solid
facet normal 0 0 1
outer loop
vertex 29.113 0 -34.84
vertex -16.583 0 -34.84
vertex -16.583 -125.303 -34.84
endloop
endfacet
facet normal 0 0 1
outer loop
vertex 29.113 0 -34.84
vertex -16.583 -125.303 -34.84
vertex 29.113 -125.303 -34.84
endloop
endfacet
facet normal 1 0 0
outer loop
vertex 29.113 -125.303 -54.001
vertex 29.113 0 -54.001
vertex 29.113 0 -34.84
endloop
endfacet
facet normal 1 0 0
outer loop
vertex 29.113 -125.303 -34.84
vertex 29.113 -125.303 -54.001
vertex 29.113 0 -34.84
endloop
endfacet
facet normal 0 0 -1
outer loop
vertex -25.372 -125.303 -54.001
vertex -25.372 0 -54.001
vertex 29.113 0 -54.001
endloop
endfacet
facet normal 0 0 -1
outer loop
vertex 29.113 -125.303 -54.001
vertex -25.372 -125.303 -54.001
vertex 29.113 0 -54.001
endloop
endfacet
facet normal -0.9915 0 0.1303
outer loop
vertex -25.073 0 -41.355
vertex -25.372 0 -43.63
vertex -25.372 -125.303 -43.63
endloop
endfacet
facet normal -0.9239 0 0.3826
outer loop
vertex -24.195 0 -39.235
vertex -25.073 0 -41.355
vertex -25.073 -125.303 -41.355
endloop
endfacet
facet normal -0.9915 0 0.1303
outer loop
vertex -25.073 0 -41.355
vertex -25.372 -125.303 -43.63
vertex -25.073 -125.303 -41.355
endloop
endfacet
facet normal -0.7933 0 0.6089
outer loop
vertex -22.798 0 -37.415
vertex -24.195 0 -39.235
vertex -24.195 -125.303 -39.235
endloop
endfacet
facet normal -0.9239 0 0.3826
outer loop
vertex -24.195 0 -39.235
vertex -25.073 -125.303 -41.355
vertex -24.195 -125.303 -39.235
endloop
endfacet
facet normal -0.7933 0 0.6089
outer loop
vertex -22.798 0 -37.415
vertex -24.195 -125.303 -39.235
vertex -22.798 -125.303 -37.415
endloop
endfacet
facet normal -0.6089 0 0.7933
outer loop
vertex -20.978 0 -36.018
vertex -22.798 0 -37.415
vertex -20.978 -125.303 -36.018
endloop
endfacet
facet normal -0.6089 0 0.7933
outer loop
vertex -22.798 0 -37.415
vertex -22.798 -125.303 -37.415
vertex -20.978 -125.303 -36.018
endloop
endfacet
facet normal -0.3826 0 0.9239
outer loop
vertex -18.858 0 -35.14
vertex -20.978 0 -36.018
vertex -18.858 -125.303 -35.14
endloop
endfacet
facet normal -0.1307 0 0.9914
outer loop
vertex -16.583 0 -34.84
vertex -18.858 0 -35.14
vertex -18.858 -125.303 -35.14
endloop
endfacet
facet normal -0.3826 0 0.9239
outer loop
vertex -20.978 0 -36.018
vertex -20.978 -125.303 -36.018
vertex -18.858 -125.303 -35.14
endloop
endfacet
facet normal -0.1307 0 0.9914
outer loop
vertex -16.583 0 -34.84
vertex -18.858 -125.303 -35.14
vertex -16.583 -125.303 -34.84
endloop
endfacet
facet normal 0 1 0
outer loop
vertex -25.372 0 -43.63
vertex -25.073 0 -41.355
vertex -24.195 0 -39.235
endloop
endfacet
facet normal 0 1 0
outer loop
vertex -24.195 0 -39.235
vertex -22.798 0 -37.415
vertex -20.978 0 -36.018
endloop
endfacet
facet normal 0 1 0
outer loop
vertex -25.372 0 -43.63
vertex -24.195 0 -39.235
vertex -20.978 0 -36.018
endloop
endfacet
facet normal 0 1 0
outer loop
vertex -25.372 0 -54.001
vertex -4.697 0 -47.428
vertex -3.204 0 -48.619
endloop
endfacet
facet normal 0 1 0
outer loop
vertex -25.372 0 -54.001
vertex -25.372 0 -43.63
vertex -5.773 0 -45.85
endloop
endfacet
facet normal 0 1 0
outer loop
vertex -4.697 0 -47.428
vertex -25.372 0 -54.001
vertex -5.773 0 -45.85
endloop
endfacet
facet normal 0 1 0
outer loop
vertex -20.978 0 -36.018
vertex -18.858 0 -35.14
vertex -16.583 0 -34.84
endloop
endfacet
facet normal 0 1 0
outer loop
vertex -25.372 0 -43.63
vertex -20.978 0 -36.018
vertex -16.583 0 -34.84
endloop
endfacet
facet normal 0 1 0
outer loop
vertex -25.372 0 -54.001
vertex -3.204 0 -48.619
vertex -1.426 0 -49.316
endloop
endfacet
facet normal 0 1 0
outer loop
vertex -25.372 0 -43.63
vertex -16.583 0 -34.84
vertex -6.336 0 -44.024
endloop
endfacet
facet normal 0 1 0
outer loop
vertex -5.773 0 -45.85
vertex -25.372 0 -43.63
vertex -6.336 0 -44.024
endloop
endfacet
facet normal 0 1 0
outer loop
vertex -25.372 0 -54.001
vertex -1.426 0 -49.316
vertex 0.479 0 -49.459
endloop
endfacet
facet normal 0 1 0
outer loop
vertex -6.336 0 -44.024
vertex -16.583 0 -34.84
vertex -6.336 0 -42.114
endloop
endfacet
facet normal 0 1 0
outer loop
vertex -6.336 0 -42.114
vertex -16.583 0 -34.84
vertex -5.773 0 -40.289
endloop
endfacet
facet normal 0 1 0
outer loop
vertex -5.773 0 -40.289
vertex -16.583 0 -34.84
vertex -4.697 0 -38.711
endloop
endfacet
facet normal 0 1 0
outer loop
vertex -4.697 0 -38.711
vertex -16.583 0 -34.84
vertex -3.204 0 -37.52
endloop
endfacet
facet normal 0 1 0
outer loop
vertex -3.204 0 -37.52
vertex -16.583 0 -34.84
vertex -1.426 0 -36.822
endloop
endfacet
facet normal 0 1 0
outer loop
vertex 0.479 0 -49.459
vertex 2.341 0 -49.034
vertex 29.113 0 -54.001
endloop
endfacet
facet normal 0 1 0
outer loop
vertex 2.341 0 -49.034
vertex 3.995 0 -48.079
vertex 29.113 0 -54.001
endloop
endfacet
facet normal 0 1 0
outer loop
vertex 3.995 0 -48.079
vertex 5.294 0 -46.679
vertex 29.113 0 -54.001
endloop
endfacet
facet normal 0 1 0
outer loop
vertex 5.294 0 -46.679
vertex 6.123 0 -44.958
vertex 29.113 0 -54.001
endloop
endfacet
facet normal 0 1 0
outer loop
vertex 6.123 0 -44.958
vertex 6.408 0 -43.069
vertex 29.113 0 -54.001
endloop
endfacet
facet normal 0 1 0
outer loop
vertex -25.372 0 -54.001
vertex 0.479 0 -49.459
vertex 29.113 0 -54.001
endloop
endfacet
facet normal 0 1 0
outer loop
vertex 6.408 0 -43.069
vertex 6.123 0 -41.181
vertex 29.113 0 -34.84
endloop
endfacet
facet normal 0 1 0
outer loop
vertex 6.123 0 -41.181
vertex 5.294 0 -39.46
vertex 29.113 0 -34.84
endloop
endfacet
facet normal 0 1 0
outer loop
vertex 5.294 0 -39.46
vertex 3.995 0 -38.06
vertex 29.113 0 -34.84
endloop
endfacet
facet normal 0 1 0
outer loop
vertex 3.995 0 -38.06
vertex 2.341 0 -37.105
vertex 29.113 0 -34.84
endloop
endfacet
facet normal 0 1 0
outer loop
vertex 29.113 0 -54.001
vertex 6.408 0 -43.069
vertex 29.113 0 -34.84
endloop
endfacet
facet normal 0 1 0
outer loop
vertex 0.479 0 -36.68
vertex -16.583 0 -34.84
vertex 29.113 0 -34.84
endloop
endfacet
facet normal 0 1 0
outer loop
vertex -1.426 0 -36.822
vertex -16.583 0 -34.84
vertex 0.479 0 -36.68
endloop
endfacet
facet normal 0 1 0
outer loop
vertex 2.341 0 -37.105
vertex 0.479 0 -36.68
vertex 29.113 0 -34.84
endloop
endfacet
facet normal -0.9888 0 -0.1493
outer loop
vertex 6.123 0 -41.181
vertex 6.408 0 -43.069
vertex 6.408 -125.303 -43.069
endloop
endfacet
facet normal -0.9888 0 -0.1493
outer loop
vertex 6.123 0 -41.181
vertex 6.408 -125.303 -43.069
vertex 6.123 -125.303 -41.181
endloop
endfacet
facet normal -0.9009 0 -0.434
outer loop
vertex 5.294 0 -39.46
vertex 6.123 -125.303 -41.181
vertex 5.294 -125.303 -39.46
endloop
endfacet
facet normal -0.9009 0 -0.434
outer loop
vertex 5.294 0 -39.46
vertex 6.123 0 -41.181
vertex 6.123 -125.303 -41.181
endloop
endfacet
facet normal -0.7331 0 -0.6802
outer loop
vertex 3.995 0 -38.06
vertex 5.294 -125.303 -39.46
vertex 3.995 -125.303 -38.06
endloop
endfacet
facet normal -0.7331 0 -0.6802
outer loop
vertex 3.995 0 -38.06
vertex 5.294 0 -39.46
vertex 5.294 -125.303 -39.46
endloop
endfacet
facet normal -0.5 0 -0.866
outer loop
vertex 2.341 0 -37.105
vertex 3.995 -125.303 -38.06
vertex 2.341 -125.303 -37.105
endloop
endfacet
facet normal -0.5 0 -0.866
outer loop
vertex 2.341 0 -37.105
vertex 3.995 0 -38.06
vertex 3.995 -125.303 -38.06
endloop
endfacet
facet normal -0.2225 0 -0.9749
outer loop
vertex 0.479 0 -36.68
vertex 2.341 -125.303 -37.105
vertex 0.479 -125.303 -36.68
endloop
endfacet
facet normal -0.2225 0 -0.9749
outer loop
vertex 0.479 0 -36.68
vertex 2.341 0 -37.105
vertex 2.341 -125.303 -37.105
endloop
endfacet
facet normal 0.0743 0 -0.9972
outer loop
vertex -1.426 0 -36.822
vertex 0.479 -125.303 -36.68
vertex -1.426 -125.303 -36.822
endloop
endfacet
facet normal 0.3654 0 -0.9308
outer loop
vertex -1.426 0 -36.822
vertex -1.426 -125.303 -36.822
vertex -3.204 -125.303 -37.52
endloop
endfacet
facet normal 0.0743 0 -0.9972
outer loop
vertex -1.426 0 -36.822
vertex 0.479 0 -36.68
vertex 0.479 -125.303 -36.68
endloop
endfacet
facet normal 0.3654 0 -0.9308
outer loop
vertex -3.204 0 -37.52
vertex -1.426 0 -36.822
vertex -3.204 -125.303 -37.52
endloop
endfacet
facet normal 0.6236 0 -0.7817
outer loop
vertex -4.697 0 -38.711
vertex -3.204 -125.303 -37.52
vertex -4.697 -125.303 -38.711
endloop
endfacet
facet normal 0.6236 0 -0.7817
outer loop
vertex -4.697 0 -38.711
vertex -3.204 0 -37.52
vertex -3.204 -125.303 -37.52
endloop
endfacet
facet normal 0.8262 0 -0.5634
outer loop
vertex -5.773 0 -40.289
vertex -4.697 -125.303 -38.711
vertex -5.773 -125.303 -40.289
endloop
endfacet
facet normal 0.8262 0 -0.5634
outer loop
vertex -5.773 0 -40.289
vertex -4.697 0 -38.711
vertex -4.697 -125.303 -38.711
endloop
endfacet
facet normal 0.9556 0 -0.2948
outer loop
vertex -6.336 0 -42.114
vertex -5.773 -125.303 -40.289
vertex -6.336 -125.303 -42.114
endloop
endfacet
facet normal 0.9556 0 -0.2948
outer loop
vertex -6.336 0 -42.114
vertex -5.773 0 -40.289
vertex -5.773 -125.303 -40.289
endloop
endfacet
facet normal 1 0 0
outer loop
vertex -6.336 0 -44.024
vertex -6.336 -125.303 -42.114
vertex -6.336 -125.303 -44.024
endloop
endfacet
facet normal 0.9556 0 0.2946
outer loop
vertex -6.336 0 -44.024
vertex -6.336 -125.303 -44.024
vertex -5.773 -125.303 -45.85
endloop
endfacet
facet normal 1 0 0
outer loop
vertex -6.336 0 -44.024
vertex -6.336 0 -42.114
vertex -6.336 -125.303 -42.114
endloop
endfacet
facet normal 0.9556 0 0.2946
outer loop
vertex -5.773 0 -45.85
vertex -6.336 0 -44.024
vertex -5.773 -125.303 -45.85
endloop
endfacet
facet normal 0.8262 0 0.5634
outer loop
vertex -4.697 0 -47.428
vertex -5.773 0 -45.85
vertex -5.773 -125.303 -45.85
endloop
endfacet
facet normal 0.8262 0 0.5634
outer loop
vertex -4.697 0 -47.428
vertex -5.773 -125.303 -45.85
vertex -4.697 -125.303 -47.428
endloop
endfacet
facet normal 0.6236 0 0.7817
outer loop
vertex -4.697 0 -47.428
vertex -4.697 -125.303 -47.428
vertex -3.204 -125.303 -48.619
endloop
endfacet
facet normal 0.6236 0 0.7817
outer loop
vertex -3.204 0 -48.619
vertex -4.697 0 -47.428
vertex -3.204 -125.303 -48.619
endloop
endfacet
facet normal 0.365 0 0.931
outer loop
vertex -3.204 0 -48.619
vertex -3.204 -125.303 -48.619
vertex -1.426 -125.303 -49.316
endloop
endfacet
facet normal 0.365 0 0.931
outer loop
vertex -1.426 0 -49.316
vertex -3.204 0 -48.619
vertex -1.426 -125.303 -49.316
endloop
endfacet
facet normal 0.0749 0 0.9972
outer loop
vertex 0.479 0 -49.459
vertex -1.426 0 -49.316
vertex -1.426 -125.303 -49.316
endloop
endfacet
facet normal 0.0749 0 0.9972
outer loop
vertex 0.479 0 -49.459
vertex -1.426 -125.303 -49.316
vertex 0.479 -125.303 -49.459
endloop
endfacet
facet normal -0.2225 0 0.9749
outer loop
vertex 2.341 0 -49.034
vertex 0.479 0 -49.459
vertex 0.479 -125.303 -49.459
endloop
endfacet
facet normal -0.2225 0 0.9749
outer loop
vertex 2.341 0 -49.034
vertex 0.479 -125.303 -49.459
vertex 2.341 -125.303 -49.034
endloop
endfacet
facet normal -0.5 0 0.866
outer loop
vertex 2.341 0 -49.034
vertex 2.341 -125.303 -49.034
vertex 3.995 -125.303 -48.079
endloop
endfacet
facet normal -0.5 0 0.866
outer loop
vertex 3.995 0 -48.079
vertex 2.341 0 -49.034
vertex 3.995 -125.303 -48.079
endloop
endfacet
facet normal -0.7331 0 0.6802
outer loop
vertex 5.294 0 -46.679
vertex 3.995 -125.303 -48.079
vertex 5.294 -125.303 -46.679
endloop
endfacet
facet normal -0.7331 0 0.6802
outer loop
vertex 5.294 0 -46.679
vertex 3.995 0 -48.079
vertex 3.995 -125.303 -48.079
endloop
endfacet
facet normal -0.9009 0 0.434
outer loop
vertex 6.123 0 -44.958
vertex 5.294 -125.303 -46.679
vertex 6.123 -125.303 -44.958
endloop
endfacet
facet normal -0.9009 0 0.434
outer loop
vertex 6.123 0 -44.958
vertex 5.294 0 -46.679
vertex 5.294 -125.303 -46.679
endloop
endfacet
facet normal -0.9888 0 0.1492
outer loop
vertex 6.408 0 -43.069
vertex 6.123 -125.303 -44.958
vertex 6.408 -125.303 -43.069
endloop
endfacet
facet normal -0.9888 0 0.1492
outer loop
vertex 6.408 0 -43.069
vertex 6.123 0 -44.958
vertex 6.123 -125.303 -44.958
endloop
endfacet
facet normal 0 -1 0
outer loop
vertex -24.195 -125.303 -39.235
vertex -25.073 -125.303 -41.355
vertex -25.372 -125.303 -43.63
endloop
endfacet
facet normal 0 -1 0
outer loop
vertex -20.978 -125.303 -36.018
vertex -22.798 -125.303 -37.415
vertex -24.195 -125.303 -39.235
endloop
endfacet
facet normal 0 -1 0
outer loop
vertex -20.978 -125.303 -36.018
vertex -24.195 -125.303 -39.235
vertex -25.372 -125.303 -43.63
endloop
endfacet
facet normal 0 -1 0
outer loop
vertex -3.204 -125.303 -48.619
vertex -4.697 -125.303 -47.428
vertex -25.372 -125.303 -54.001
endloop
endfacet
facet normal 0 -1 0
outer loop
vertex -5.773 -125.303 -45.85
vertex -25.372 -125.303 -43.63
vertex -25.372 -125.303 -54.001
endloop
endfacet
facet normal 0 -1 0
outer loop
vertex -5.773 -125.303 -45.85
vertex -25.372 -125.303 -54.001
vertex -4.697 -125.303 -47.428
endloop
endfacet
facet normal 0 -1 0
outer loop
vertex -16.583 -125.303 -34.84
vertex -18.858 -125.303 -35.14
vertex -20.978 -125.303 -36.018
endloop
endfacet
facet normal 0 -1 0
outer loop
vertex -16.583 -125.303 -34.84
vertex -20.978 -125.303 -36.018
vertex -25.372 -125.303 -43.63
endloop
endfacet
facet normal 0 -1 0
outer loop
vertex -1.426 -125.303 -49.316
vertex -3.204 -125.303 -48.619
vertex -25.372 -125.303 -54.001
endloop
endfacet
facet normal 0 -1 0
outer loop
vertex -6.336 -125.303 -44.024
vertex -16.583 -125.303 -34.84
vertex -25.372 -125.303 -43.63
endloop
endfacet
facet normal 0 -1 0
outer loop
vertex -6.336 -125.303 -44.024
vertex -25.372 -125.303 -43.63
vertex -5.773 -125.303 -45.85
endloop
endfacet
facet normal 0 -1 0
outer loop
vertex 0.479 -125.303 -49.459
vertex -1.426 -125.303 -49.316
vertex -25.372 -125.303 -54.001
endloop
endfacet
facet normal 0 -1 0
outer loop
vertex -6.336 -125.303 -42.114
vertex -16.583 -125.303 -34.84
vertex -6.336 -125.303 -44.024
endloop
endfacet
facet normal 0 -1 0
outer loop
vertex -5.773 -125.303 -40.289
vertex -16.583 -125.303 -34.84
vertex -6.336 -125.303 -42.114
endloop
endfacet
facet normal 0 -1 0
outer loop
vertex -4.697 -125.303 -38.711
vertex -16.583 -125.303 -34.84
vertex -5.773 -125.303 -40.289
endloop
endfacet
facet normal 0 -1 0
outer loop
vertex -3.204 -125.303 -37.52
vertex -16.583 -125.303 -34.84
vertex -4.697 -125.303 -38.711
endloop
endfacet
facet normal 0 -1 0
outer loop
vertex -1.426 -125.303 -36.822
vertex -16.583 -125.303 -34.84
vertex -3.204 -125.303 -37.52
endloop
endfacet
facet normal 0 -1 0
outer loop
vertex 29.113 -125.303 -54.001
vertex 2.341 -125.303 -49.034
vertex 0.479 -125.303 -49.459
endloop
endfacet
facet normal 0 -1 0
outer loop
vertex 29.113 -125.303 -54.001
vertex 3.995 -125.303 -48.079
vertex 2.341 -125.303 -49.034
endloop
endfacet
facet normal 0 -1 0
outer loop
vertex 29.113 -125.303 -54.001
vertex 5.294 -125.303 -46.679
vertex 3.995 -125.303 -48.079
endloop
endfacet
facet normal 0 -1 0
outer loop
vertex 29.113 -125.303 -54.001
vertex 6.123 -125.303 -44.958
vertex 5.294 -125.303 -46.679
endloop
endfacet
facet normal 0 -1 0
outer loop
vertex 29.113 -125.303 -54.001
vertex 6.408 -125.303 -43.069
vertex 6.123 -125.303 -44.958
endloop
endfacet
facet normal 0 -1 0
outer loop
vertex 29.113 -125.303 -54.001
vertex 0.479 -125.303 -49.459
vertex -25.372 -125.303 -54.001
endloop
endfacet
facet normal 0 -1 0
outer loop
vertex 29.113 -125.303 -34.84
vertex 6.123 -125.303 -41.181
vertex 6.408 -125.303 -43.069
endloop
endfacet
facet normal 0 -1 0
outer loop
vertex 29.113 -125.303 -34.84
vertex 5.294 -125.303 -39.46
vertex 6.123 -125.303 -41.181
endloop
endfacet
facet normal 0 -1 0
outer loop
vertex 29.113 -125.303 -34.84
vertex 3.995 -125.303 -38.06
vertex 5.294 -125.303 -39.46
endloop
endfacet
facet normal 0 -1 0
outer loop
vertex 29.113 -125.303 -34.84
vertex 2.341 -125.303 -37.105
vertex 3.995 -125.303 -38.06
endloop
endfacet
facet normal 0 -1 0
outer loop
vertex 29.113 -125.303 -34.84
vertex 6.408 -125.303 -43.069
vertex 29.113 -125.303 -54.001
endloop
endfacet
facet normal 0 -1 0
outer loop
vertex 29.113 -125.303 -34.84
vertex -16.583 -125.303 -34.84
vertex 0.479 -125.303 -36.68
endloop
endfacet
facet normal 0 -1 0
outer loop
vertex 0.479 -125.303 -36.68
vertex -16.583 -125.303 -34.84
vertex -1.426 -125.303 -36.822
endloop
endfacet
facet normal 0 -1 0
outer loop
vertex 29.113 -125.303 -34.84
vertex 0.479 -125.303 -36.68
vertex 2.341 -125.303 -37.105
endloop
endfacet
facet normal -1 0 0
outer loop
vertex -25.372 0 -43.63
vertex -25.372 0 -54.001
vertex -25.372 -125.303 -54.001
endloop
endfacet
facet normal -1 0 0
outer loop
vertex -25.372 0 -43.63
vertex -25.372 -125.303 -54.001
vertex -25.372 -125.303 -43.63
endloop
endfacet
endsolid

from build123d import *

# Parameters (mm, degrees)
F0_W     = 54.485863
F0_H     = 19.160416
F0_R     = 6.40756
F1_DEPTH = 125.30254
F2_R     = 8.789693


with BuildPart() as f1:
    # F0 (on Front) → F1 (new body)
    with BuildSketch(Plane.XZ):
        with Locations((1.870436, -44.420557)):
            Rectangle(F0_W, F0_H)
        with Locations((0, -43.069407)):
            Circle(F0_R, mode=Mode.SUBTRACT)
    extrude(amount=F1_DEPTH)

    # F2
    f2_edges = [f1.edges().sort_by_distance(p)[0] for p in [
        (-25.372496, -62.65127, -34.840349),
    ]]
    fillet(f2_edges, radius=F2_R)


solid = f1.part
